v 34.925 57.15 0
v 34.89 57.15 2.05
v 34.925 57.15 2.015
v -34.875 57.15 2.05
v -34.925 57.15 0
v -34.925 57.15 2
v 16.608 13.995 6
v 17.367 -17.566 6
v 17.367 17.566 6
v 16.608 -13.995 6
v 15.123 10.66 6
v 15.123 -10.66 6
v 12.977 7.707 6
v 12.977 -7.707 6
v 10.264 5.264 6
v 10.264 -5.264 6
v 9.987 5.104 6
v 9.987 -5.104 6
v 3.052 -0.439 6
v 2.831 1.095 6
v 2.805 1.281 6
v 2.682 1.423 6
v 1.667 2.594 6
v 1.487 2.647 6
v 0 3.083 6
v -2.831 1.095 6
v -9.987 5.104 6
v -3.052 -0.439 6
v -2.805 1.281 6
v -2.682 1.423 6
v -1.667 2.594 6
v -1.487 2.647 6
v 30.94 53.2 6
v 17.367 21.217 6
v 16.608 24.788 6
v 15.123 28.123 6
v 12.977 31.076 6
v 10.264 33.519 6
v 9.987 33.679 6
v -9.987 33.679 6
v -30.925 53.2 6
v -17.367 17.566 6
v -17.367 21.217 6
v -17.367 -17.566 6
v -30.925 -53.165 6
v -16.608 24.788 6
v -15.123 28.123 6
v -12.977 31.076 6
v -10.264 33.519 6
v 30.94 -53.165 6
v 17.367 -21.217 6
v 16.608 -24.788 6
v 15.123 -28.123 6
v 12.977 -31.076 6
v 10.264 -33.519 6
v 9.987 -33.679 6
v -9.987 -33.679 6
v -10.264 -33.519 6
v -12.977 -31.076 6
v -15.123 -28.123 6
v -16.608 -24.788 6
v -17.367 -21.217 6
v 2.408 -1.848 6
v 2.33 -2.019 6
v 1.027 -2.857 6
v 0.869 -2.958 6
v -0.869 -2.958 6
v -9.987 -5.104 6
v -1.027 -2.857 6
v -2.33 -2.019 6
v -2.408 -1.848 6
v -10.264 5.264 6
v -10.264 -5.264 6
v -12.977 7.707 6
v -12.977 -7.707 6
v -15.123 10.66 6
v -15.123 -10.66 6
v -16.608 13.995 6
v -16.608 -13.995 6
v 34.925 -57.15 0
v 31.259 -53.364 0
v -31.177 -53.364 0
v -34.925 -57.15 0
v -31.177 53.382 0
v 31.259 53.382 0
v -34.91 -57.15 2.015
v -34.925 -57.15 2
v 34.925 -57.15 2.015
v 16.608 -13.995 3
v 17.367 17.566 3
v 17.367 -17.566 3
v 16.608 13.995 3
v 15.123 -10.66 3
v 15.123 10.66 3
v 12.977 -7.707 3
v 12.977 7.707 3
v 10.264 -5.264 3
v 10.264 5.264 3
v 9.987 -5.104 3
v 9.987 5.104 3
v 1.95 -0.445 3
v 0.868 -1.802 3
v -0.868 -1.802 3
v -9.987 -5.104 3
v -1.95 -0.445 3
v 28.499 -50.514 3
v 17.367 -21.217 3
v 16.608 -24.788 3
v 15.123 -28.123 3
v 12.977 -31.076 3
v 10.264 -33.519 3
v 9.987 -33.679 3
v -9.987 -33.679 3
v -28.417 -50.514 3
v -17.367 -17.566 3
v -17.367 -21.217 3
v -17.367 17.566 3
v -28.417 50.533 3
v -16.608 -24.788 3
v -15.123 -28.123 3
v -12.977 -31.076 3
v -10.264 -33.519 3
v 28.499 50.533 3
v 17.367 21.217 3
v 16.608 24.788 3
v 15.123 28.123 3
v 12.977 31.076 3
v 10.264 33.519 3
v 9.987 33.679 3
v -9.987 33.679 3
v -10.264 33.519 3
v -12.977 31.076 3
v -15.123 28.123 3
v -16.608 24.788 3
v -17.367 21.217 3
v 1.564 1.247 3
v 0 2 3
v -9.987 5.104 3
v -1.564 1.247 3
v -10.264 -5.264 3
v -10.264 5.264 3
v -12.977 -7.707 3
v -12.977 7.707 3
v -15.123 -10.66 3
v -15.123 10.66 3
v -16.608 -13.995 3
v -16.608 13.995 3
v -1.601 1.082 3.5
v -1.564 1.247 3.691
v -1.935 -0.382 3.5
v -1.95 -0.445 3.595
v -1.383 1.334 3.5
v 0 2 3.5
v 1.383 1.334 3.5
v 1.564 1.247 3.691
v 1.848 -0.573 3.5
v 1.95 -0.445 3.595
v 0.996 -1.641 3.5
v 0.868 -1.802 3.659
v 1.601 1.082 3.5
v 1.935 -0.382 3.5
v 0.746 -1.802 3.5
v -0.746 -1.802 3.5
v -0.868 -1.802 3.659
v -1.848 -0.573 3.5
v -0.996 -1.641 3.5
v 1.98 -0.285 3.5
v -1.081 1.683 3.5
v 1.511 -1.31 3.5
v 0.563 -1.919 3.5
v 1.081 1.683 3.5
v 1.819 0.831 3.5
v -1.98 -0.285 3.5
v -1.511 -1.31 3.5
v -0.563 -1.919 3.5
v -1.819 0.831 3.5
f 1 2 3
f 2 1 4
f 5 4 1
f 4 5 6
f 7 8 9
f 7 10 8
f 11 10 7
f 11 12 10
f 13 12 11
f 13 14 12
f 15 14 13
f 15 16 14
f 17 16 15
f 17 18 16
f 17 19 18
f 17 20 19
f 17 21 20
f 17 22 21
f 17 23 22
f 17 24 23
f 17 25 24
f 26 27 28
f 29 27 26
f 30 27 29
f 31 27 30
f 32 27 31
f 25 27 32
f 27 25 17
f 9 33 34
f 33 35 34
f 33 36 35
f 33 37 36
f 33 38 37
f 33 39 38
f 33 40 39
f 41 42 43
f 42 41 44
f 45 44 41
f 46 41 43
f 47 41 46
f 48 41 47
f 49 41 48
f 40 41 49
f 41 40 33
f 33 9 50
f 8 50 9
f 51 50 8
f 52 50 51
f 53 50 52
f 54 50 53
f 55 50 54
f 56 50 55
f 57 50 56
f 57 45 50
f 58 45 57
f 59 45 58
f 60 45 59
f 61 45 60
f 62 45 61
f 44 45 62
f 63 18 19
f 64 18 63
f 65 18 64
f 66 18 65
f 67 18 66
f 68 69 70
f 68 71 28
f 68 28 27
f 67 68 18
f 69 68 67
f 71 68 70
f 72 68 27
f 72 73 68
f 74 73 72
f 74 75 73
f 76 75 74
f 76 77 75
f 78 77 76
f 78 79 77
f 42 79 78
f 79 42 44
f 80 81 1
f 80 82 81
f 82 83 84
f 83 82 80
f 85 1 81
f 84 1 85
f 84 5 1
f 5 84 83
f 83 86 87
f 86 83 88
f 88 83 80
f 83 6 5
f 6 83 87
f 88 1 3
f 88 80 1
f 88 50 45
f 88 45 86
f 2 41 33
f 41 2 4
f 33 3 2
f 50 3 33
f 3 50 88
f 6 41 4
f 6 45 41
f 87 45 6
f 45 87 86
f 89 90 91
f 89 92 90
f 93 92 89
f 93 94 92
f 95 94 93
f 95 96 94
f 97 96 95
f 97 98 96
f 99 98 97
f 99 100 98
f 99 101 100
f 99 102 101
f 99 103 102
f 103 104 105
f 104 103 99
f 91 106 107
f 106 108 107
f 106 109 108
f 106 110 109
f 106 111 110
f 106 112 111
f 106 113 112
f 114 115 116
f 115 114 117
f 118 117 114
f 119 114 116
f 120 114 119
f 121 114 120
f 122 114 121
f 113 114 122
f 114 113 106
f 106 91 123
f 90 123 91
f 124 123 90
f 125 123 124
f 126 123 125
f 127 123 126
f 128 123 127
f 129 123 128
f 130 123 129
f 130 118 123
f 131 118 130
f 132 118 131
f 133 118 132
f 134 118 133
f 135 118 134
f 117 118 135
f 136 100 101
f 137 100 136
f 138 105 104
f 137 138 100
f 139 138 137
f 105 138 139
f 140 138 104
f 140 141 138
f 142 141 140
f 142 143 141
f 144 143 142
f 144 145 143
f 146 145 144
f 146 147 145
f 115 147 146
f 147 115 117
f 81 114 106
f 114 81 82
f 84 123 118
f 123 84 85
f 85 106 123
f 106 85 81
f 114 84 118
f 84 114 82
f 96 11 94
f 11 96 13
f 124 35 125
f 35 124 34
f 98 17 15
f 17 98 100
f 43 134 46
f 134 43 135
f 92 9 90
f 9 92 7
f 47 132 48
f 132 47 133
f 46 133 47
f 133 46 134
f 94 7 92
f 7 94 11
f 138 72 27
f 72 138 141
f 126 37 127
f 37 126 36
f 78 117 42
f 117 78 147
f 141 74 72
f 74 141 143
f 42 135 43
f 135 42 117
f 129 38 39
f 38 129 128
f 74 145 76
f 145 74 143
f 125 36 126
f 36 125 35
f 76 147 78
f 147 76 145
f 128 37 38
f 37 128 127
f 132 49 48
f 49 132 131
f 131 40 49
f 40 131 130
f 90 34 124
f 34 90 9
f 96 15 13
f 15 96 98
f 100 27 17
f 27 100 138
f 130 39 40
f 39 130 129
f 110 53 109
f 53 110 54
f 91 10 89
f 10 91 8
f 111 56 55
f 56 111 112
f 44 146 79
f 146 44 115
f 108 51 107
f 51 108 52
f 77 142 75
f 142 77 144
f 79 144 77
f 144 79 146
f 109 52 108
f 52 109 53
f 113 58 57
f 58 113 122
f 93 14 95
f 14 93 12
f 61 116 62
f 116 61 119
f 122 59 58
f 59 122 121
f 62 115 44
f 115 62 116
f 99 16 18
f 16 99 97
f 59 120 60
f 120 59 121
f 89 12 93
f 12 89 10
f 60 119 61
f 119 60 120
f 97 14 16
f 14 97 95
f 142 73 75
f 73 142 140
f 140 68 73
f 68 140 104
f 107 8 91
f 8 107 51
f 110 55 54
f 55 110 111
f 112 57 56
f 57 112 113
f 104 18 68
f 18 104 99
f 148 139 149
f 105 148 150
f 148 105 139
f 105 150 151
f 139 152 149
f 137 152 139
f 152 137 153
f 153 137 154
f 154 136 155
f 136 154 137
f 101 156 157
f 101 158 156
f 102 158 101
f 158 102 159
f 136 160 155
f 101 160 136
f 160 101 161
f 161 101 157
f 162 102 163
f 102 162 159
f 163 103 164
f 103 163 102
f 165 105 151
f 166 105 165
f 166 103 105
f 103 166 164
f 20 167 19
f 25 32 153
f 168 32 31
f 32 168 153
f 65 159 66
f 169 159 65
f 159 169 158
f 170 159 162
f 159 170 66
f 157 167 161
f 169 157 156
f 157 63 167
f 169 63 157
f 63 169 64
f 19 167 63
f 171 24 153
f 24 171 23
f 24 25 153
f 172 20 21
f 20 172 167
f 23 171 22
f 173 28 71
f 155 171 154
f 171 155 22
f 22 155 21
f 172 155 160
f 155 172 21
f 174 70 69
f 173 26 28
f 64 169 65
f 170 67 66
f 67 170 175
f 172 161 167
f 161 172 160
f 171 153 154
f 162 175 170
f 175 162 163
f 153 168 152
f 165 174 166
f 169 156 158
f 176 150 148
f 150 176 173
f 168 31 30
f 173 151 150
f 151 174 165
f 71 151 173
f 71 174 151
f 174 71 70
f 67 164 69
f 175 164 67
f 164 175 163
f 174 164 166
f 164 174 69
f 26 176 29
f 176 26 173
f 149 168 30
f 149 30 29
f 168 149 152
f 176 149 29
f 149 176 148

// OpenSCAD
// The dimentions are from the model made at TheNewHobbyist at
//      https://www.printables.com/model/72079-wally-wall-plate-customizer


//TODO: Comment to TheNewHobbyist about the 'go away Customizer' comment

//TODO: Comment to TheNewHobbyist about the 'Number One ENGAGE' comment


1st_plate = "keystone1";

1st_plate_bottom_hole = "outlet";






//How big are we talkin' here?
plate_width = 1; //	[1:5]


// Bigger hole in your wall? Try this
plate_size = 0; // [0:Standard, 1:Junior-Jumbo, 2:Jumbo]

height_sizes = [114.3,123.825,133.35];

height = 114.3; //plate height (static)


l_offset = [34.925,39.6875,44.45];
r_offset = [34.925,39.6875,44.45];
spacer = [0,0,46.0375,92.075,138.1125,184.15];
solid_plate_width = l_offset[plate_size] + spacer[plate_width] + r_offset[plate_size];


edgewidth = solid_plate_width + 10; // Bevel setting for top and bottom
rightbevel = solid_plate_width - 4; // Bevel for right side (scales)



thinner_offset=[0,0.92,0.95,0.96,0.97,0.973]; // Manual fix for right side wackiness



powerOutletCover();

//plate1();//1st_plate = 1st_plate,            1st_plate_bottom_hole = 1st_plate_bottom_hole);
module powerOutletCover()
{
    ////////////////////////
	// Number One ENGAGE: //
	////////////////////////

	// Rotate so it sits correctly on plate (whoops) and make upside down
	rotate([0,0,90])
	{
		// put plate at 0,0,0 for easier printing
		translate([-height_sizes[plate_size]/2,
				  -solid_plate_width/2,
				  0])
		{
			if (plate_width == 1) {
				difference() {
					plate();
					translate([0,0,-3]) plate_inner();
					plate1();
						}
					union() {
					plate1_solid();
					}
						}

			else if (plate_width == 2) {
			difference()
			{
			plate();
			translate([0,0,-3]) plate_inner();
			plate1();
			plate2();
			}
			union() {
					plate1_solid();
					plate2_solid();
					}
			}

			else if (plate_width == 3) {
			difference()
			{
			plate();
			translate([0,0,-3]) plate_inner();
			plate1();
			plate2();
			plate3();
			}
			union() {
					plate1_solid();
					plate2_solid();
					plate3_solid();
					}
			}

			else if (plate_width == 4) {
			difference()
			{
			plate();
			translate([0,0,-3]) plate_inner();
			plate1();
			plate2();
			plate3();
			plate4();
			}
			union() {
					plate1_solid();
					plate2_solid();
					plate3_solid();
					plate4_solid();
					}
			}

			else if (plate_width == 5) {
			difference()
			{
			plate();
			translate([0,0,-3]) plate_inner();
			plate1();
			plate2();
			plate3();
			plate4();
			plate5();
			}
			union() {
					plate1_solid();
					plate2_solid();
					plate3_solid();
					plate4_solid();
					plate5_solid();
					}
			}

			
		}
	}
}



// plate1_solid(1st_plate = 1st_plate,
//              1st_plate_bottom_hole = 1st_plate_bottom_hole);

module plate1_solid()
{
    if (1st_plate == "keystone1" && 1st_plate_bottom_hole == "none") {
        translate([height_sizes[plate_size]/2 + 14.3,l_offset[plate_size] - 11.5,-3.9]) hole("keystone_solid");
        }
    else if (1st_plate == "keystone1" && 1st_plate_bottom_hole != "outlet" && 1st_plate_bottom_hole != "toggle" && 1st_plate_bottom_hole != "rocker") 
    {
        translate([height_sizes[plate_size]/2,l_offset[plate_size] - 11.5,-3.9]) hole("keystone_solid");
    }
    if (1st_plate_bottom_hole == "keystone1" && 1st_plate == "none") {
        translate([height_sizes[plate_size]/2 + 14.3,l_offset[plate_size] - 11.5,-3.9]) hole("keystone_solid");
        }
    else if (1st_plate_bottom_hole == "keystone1" && 1st_plate != "outlet" && 1st_plate != "toggle" && 1st_plate != "rocker") {
        translate([height_sizes[plate_size]/2 + 28.5,l_offset[plate_size] - 11.5,-3.9]) hole("keystone_solid");
	}
}



module outletCutout()
{
    hole_type = "outlet";


    // Duplex power outlet plate or dual side toggles
    if (hole_type == "outlet" || hole_type == "dualsidetoggle") 
    {
            translate([height_sizes[plate_size]/2 + 19.3915,0,0]) 
            {
                difference() {
                    cylinder(r=17.4625, h=15, center = true);
                    translate([-24.2875,-15,-2]) cube([10,37,15], center = false);
                    translate([14.2875,-15,-2]) cube([10,37,15], center = false);
                                    }
                                
            }
            
            translate([height_sizes[plate_size]/2 - 19.3915,0,0])
            {
                difference(){
                    cylinder(r=17.4625, h=15, center = true);
                    translate([-24.2875,-15,-2]) cube([10,37,15], center = false);
                    translate([14.2875,-15,-2]) cube([10,37,15], center = false);
                                    }
            }
            
            translate([height_sizes[plate_size]/2,0,-1]) cylinder(r=2, h=10);
            translate([height_sizes[plate_size]/2,0,3.5]) cylinder(r1=2, r2=3.3, h=3);                    
    }
}




module plate1(){
	if (1st_plate == "toggle" || 1st_plate_bottom_hole == "toggle"){
		translate([0,l_offset[plate_size],0]) toggle_screws();
		translate([0,l_offset[plate_size],0]) hole("toggle");
		}
	else if (1st_plate == "long_toggle" || 1st_plate_bottom_hole == "long_toggle"){
		translate([0,l_offset[plate_size],0]) toggle_screws();
		translate([0,l_offset[plate_size],0]) hole("long_toggle");
		}
	else if (1st_plate == "rocker" || 1st_plate_bottom_hole == "rocker"){
		translate([0,l_offset[plate_size],0]) rocker_screws();
		translate([0,l_offset[plate_size],0]) hole("rocker");
		}
	else if (1st_plate == "outlet" || 1st_plate_bottom_hole == "outlet") {
	translate([0,l_offset[plate_size],0]) hole("outlet");
	}
	else if (1st_plate_bottom_hole == "none") {
		translate([0,l_offset[plate_size],0]) box_screws();
		translate([positions[0],l_offset[plate_size],0]) hole(1st_plate);
			}
	else if (1st_plate == "none") {
		translate([0,l_offset[plate_size],0]) box_screws();
		translate([positions[0],l_offset[plate_size],0]) hole(1st_plate_bottom_hole);
			}
	else {
	translate([0,l_offset[plate_size],0]) box_screws();
	translate([positions[1],l_offset[plate_size],0]) hole(1st_plate);
	translate([positions[2],l_offset[plate_size],0]) hole(1st_plate_bottom_hole);
	}
}





// remove the other stuff
// Hole Cutout definitions
module hole(hole_type) 
{
    echo("hole-1");

// Toggle switch hole
	if (hole_type == "toggle") {
		translate([height_sizes[plate_size]/2,0,0]) cube([23.8125,10.3188,15], center = true);
		 						}

// Toggle switch hole and screw holes
	if (hole_type == "long_toggle") {
		translate([height_sizes[plate_size]/2,0,0]) cube([43.6563,11.9063,15], center = true);
		 						}

// Rocker switch plate
	if (hole_type == "rocker") {
		translate([height_sizes[plate_size]/2,0,0]) cube([67.1,33.3,15], center = true);

		 						}

// Duplex power outlet plate or dual side toggles
	if (hole_type == "outlet" || hole_type == "dualsidetoggle") {
		translate([height_sizes[plate_size]/2 + 19.3915,0,0]) {
			difference() {
				cylinder(r=17.4625, h=15, center = true);
				translate([-24.2875,-15,-2]) cube([10,37,15], center = false);
				translate([14.2875,-15,-2]) cube([10,37,15], center = false);
								}
							}
		translate([height_sizes[plate_size]/2 - 19.3915,0,0]){
			difference(){
				cylinder(r=17.4625, h=15, center = true);
				translate([-24.2875,-15,-2]) cube([10,37,15], center = false);
				translate([14.2875,-15,-2]) cube([10,37,15], center = false);
								}
							}
		translate([height_sizes[plate_size]/2,0,-1]) cylinder(r=2, h=10);
		translate([height_sizes[plate_size]/2,0,3.5]) cylinder(r1=2, r2=3.3, h=3);
							}

// Blank plate
	if (hole_type == "blank") { }

// VGA & DB09 plate
// VGA Fits http://www.datapro.net/products/vga-dual-panel-mount-f-f-cable.html
// DB09 Fits http://www.datapro.net/products/db9-serial-panel-mount-male-extension.html
	if (hole_type == "vga" || hole_type == "db09") {

			translate([0,-12.5,3]) cylinder(r=1.75, h=10, center = true);
			translate([0,12.5,3]) cylinder(r=1.75, h=10, center = true);
				difference(){
					cube([10,19,13], center=true);
					translate([-5,-9.2,1]) rotate([0,0,-35.6]) cube([4.4,2.4,15], center=true);
					translate([.9,-11.2,0]) rotate([0,0,9.6]) cube([10,4.8,15], center=true);
					translate([4.6,-8.5,0]) rotate([0,0,37.2]) cube([4.4,2.4,15], center=true);
					translate([-5,9.2,1]) rotate([0,0,35.6]) cube([4.4,2.4,15], center=true);
					translate([0.9,11.2,0]) rotate([0,0,-9.6]) cube([10,4.8,15], center=true);
					translate([4.6,8.5,0]) rotate([0,0,-37.2]) cube([4.4,2.4,15], center=true);
								}
						}

// HDMI plate
// Fits http://www.datapro.net/products/hdmi-panel-mount-extension-cable.html
	if (hole_type == "hdmi") {
		translate([0,-13,3]) cylinder(r=1.75, h=10, center = true);
		translate([0,13,3]) cylinder(r=1.75, h=10, center = true);
		translate([0,0,3]) cube([6,16,10], center=true);
							}

// DVI-I plate
// Fits http://www.datapro.net/products/dvi-i-panel-mount-extension-cable.html
	if (hole_type == "dvi") {
		translate([0,-16,3]) cylinder(r=1.75, h=10, center = true);
		translate([0,16,3]) cylinder(r=1.75, h=10, center = true);
		translate([0,0,3]) cube([10,26,10], center=true);
							}

// DisplayPort plate
// Fits http://www.datapro.net/products/dvi-i-panel-mount-extension-cable.html
	if (hole_type == "displayport") {
		translate([0,-13.5,3]) cylinder(r=1.75, h=10, center = true);
		translate([0,13.5,3]) cylinder(r=1.75, h=10, center = true);
		translate([0,0,0]){
			difference(){
				translate([0,0,3]) cube([7,19,10], center=true);
				translate([2.47,-9.37,3]) rotate([0,0,-54.6]) cube([3,5,14], center=true);
						}
								}
									}

// USB-A Plate
// Fits http://www.datapro.net/products/usb-panel-mount-type-a-cable.html
	if (hole_type == "usb-a") {
		translate([0,-15,3]) cylinder(r=1.75, h=10, center = true);
		translate([0,15,3]) cylinder(r=1.75, h=10, center = true);
		translate([0,0,3]) cube([8,16,10], center=true);
							}

// USB-B Plate
// Fits http://www.datapro.net/products/usb-panel-mount-type-b-cable.html
	if (hole_type == "usb-b") {
		translate([0,-13,3]) cylinder(r=1.75, h=10, center = true);
		translate([0,13,3]) cylinder(r=1.75, h=10, center = true);
		translate([0,0,3]) cube([11,12,10], center=true);
							}

// 1394 Firewire Plate
// Fits http://www.datapro.net/products/firewire-panel-mount-extension.html
	if (hole_type == "firewire") {
		translate([0,-13.5,3]) cylinder(r=1.75, h=10, center = true);
		translate([0,13.5,3]) cylinder(r=1.75, h=10, center = true);
		translate([0,0,3]) cube([7,12,10], center=true);
							}

// F-Type / Cable TV Plate
// Fits http://www.datapro.net/products/f-type-panel-mounting-coupler.html
	if (hole_type == "f-type") {
		translate([0,0,3]) cylinder(r=4.7625, h=10, center=true);
							}

// Cat5e & Gat6 plate
// Cat5e Fits http://www.datapro.net/products/cat-5e-panel-mount-ethernet.html
// Cat6 Fits hhttp://www.datapro.net/products/cat-6-panel-mount-ethernet.html
	if (hole_type == "cat5e" || hole_type == "cat6") {
		translate([0,-12.5,3]) cylinder(r=1.75, h=10, center = true);
		translate([0,12.5,3]) cylinder(r=1.75, h=10, center = true);
		translate([0,0,3]) cube([15,15,10], center=true);
		}

// S-Video & PS2 plate
// S-Video Fits hhttp://www.datapro.net/products/cat-6-panel-mount-ethernet.html
// PS2 http://www.datapro.net/products/ps2-panel-mount-extension-cable.html
	if (hole_type == "svideo" || hole_type == "ps2") {
		translate([0,-10,3]) cylinder(r=1.75, h=10, center = true);
		translate([0,10,3]) cylinder(r=1.75, h=10, center = true);
		translate([0,0,3]) cylinder(r=5, h=10, center=true);
		}


// Stereo / 1/4" headphone jack coupler
// Stereo coupler Fits http://www.datapro.net/products/stereo-panel-mount-coupler.html
	if (hole_type == "stereo") {
		translate([0,0,3]) cylinder(r=2.985, h=10, center=true);
		}

//Keystone1 hole
//Hole for 1 Keystone Jack
	if (hole_type == "keystone1") {
		translate([0,0,5]) cube([16.5,15,10], center = true);
	}

//Keystone Solid
	if (hole_type == "keystone_solid") {
		rotate([0,0,90]) {
			difference(){
				translate([0,0,.1]) cube([23,30.5,9.8]);
					translate([4,4,0]){
						difference(){
							cube([15,22.5,10]);
							translate([-1,-0.001,3.501]) cube([17,2,6.5]);
							translate([-1,2.5,-3.40970]) rotate([45,0,0]) cube([17,2,6.5]);
							translate([-1,18.501,6.001]) cube([17,4,4]);
							translate([-1,20.5,0]) rotate([-45,0,0]) cube([17,2,6.5]);
						}
					}
				}
			}
		}

//End of module "hole"
}




  ///////////////////
 // PlateStation: //
///////////////////

//Plate size and bevel
module plate() {
	difference() {
		cube([height_sizes[plate_size],solid_plate_width,6]);
		translate([-4.3,-5,6.2]) rotate([0,45,0]) cube([6,edgewidth,6]); //Top Bevel
		translate([height_sizes[plate_size]-4.2,-5,6.25]) rotate([0,45,0]) cube([6,edgewidth,6]); //Bottom Bevel
		translate([height_sizes[plate_size]+10,-4.4,6.1]) rotate([0,45,90]) cube([6,height_sizes[plate_size]+20,6]); //Left Bevel (doesn't change)
		translate([height_sizes[plate_size]+10,rightbevel,6]) rotate([0,45,90]) cube([6,height_sizes[plate_size]+10,6]); //Right Bevel (scales right)
				}
			}


// Thinning Plate
module plate_inner() {
	scale([0.95,thinner_offset[plate_width],1]){
	translate([3,3,0]){
	difference() {
		cube([height_sizes[plate_size],solid_plate_width,6]);
		translate([-4.3,-5,6.2]) rotate([0,45,0]) cube([6,edgewidth,6]); //Top Bevel
		translate([height_sizes[plate_size]-4.2,-5,6.25]) rotate([0,45,0]) cube([6,edgewidth,6]); //Bottom Bevel
		translate([height_sizes[plate_size]+10,-4.4,6.1]) rotate([0,45,90]) cube([6,height_sizes[plate_size]+20,6]); //Left Bevel (doesn't change)
		translate([height_sizes[plate_size]+10,rightbevel,6]) rotate([0,45,90]) cube([6,height_sizes[plate_size]+10,6]); //Right Bevel (scales right)
				}
			}
		}
	}
